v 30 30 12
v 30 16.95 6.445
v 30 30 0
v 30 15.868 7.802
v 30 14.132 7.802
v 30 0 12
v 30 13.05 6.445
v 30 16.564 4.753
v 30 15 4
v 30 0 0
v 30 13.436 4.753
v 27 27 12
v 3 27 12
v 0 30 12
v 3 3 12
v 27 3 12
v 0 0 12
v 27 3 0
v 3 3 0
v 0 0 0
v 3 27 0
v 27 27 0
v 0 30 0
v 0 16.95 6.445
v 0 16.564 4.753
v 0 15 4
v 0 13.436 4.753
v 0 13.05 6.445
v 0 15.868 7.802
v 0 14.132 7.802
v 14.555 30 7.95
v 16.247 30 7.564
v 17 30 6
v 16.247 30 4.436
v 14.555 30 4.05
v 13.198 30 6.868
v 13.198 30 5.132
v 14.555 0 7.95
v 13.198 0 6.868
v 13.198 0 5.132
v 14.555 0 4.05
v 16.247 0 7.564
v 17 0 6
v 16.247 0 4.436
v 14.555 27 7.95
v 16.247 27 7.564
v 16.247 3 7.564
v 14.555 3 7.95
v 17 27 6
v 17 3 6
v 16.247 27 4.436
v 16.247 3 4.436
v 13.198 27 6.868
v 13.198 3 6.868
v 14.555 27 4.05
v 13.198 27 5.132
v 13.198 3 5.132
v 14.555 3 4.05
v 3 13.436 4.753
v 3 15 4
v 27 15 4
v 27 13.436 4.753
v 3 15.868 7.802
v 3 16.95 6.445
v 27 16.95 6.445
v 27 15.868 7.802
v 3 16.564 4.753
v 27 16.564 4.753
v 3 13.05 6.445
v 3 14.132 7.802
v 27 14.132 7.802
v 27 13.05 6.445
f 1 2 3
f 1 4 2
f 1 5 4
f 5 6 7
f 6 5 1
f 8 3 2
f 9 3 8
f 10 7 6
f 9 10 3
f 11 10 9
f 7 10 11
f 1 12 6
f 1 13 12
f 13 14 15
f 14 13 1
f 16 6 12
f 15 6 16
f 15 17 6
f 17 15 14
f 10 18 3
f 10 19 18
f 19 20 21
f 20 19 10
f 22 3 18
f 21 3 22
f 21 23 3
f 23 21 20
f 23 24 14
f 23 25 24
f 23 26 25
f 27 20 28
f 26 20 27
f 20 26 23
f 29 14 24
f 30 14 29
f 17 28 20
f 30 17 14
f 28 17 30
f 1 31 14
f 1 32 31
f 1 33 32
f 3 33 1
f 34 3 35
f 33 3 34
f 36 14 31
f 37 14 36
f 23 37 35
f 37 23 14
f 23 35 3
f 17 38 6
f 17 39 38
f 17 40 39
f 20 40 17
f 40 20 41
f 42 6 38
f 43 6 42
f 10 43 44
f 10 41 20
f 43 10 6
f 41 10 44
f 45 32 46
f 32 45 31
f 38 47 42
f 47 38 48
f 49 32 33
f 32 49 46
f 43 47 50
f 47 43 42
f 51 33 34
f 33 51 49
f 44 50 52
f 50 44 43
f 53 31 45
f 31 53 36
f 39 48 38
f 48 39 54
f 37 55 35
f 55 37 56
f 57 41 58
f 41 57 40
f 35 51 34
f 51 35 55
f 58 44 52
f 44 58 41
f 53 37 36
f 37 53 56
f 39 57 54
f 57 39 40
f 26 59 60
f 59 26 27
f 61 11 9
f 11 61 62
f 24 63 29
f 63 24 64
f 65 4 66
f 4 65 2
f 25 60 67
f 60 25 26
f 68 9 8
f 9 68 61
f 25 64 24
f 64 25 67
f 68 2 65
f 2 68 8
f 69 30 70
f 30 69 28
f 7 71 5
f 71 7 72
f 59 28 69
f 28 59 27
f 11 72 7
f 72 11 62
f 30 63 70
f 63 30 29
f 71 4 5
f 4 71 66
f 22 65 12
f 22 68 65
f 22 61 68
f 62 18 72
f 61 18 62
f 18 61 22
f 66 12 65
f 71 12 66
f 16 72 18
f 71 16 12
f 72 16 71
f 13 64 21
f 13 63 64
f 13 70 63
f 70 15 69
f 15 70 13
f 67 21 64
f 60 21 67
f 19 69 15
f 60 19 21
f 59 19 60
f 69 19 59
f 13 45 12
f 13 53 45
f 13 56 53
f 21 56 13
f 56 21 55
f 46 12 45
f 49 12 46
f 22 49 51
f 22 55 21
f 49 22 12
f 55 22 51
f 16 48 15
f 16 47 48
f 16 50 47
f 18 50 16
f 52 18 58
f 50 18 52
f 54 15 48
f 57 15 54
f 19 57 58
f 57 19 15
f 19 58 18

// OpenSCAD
//cable loop
l=30;
w=30;
h=12;
thick=3;//wall thickness
bolt=4;//size of the boltholes
difference (){
   cube([l,w,h]);
    translate ([l/2,w/2,h/2])
    rotate ([90,0,0])
    cylinder (d=bolt, h=w+1, center = true);
    translate ([l/2,w/2,h/2])
    rotate ([0,90,0])
    cylinder (d=bolt, h=w+1, center = true);
    translate([thick,thick,-.1])
    cube (l-thick*2, w-thick*2, h+.2);
    }
